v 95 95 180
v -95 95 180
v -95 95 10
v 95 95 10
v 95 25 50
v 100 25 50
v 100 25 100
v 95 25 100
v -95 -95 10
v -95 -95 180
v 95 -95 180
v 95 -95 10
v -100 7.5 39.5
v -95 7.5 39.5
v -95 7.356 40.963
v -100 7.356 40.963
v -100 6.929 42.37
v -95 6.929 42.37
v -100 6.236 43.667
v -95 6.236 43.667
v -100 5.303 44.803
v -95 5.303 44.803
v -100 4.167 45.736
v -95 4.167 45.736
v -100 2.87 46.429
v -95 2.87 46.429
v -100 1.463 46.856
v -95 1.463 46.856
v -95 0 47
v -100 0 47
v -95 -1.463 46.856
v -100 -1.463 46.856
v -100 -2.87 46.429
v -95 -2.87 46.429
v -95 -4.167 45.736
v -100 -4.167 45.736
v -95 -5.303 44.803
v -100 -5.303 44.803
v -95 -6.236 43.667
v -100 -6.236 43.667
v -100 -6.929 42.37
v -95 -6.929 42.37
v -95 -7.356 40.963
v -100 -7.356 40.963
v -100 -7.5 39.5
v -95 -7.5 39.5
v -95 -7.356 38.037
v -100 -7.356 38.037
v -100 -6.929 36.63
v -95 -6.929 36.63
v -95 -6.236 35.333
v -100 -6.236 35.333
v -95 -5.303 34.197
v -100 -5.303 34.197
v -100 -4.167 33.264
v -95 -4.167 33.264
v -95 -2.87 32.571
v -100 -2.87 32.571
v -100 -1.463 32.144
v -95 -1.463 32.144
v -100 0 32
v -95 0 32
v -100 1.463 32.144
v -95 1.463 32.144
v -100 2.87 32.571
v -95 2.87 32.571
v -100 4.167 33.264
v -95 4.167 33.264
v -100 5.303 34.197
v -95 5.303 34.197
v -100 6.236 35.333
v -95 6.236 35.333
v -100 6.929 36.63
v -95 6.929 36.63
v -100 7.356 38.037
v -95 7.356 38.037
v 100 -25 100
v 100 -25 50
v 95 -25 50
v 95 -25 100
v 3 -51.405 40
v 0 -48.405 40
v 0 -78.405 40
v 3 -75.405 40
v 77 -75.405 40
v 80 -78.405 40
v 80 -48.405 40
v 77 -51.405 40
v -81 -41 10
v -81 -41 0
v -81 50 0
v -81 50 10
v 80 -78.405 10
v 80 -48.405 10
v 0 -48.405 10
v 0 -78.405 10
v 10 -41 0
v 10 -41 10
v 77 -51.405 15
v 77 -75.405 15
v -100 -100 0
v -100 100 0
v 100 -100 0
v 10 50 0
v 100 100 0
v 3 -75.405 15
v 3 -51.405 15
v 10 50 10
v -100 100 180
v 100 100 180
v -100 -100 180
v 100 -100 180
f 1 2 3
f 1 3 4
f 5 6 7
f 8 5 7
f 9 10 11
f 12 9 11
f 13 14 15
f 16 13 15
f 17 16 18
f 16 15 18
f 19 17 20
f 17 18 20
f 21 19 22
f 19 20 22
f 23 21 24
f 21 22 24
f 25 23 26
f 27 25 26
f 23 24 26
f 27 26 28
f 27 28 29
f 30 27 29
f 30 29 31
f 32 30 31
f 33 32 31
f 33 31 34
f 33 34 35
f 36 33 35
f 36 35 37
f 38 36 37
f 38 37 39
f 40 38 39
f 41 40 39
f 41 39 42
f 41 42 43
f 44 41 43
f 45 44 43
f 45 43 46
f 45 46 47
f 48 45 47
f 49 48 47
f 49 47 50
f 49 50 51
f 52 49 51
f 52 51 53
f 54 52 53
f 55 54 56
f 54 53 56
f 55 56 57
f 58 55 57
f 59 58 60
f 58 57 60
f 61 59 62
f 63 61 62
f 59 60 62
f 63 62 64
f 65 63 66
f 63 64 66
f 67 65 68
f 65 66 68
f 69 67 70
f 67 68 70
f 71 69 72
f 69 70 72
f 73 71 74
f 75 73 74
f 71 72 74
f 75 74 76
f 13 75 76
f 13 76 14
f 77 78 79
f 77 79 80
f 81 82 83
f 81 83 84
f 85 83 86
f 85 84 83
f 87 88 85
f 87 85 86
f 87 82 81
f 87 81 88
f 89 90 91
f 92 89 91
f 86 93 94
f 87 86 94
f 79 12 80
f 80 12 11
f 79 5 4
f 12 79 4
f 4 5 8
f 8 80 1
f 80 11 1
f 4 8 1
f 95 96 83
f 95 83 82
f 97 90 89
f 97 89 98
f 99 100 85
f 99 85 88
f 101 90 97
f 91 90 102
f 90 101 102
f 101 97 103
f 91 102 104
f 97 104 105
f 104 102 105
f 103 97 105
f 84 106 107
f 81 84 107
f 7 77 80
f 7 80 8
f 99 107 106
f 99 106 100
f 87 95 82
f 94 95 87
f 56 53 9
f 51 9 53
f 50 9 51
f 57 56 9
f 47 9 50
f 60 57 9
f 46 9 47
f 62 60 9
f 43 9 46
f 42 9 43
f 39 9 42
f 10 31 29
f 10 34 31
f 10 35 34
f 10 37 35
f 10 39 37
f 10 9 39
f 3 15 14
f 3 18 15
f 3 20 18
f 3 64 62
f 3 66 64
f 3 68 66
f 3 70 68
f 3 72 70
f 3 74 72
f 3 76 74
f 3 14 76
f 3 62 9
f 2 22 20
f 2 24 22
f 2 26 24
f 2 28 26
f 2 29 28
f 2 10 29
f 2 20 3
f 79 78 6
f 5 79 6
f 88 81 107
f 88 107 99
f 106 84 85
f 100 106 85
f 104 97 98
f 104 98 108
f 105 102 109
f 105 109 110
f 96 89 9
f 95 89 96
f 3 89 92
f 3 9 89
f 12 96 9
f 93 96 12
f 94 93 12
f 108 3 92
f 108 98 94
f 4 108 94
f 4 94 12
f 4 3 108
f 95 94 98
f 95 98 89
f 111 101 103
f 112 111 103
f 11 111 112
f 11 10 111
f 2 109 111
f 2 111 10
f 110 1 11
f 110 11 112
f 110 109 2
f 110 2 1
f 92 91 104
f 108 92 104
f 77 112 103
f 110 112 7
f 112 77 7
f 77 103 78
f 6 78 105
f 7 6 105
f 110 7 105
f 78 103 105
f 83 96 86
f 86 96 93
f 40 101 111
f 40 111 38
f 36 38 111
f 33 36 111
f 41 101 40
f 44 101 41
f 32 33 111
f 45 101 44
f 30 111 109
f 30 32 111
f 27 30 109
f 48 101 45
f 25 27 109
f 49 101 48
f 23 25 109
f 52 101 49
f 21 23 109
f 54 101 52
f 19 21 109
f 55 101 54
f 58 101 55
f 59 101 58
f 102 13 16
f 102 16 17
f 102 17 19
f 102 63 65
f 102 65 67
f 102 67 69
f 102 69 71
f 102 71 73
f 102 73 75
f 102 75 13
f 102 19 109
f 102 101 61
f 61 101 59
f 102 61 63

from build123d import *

# Parameters (mm, degrees)
F0_W      = 200
F0_H      = 200
F1_DEPTH  = 180
F2_W      = 190
F2_H      = 190
F3_DEPTH  = 170
F4_W      = 50
F4_H      = 50
F5_DEPTH  = 8
F6_W      = 80
F6_H      = 30
F7_DEPTH  = 30
F8_W      = 74
F8_H      = 24
F9_DEPTH  = 25
F10_W     = 91
F10_H     = 91
F11_DEPTH = 25
F12_R     = 7.5
F13_DEPTH = 25


with BuildPart() as f1:
    # F0 (on Top) → F1 (new body)
    with BuildSketch(Plane.XY):
        Rectangle(F0_W, F0_H)
    extrude(amount=F1_DEPTH)

    # F2 (on face) → F3 (cut)
    with BuildSketch(Plane.XY.offset(180)):
        Rectangle(F2_W, F2_H)
    extrude(amount=-F3_DEPTH, mode=Mode.SUBTRACT)

    # F4 (on face) → F5 (cut)
    with BuildSketch(Plane.YZ.offset(100)):
        with Locations((0, 75)):
            Rectangle(F4_W, F4_H)
    extrude(amount=-F5_DEPTH, mode=Mode.SUBTRACT)

    # F6 (on face) → F7 (join)
    with BuildSketch(Plane.XY.offset(10)):
        with Locations((40, -63.405036)):
            Rectangle(F6_W, F6_H)
    extrude(amount=F7_DEPTH)

    # F8 (on face) → F9 (cut)
    with BuildSketch(Plane.XY.offset(40)):
        with Locations((40, -63.405036)):
            Rectangle(F8_W, F8_H)
    extrude(amount=-F9_DEPTH, mode=Mode.SUBTRACT)

    # F10 (on Top) → F11 (cut)
    with BuildSketch(Plane.XY):
        with Locations((-35.5, 4.5)):
            Rectangle(F10_W, F10_H)
    extrude(amount=F11_DEPTH, mode=Mode.SUBTRACT)

    # F12 (on face) → F13 (cut)
    with BuildSketch(Plane.YZ.offset(-95)):
        with Locations((0, 39.5)):
            Circle(F12_R)
    extrude(amount=-F13_DEPTH, mode=Mode.SUBTRACT)


solid = f1.part
